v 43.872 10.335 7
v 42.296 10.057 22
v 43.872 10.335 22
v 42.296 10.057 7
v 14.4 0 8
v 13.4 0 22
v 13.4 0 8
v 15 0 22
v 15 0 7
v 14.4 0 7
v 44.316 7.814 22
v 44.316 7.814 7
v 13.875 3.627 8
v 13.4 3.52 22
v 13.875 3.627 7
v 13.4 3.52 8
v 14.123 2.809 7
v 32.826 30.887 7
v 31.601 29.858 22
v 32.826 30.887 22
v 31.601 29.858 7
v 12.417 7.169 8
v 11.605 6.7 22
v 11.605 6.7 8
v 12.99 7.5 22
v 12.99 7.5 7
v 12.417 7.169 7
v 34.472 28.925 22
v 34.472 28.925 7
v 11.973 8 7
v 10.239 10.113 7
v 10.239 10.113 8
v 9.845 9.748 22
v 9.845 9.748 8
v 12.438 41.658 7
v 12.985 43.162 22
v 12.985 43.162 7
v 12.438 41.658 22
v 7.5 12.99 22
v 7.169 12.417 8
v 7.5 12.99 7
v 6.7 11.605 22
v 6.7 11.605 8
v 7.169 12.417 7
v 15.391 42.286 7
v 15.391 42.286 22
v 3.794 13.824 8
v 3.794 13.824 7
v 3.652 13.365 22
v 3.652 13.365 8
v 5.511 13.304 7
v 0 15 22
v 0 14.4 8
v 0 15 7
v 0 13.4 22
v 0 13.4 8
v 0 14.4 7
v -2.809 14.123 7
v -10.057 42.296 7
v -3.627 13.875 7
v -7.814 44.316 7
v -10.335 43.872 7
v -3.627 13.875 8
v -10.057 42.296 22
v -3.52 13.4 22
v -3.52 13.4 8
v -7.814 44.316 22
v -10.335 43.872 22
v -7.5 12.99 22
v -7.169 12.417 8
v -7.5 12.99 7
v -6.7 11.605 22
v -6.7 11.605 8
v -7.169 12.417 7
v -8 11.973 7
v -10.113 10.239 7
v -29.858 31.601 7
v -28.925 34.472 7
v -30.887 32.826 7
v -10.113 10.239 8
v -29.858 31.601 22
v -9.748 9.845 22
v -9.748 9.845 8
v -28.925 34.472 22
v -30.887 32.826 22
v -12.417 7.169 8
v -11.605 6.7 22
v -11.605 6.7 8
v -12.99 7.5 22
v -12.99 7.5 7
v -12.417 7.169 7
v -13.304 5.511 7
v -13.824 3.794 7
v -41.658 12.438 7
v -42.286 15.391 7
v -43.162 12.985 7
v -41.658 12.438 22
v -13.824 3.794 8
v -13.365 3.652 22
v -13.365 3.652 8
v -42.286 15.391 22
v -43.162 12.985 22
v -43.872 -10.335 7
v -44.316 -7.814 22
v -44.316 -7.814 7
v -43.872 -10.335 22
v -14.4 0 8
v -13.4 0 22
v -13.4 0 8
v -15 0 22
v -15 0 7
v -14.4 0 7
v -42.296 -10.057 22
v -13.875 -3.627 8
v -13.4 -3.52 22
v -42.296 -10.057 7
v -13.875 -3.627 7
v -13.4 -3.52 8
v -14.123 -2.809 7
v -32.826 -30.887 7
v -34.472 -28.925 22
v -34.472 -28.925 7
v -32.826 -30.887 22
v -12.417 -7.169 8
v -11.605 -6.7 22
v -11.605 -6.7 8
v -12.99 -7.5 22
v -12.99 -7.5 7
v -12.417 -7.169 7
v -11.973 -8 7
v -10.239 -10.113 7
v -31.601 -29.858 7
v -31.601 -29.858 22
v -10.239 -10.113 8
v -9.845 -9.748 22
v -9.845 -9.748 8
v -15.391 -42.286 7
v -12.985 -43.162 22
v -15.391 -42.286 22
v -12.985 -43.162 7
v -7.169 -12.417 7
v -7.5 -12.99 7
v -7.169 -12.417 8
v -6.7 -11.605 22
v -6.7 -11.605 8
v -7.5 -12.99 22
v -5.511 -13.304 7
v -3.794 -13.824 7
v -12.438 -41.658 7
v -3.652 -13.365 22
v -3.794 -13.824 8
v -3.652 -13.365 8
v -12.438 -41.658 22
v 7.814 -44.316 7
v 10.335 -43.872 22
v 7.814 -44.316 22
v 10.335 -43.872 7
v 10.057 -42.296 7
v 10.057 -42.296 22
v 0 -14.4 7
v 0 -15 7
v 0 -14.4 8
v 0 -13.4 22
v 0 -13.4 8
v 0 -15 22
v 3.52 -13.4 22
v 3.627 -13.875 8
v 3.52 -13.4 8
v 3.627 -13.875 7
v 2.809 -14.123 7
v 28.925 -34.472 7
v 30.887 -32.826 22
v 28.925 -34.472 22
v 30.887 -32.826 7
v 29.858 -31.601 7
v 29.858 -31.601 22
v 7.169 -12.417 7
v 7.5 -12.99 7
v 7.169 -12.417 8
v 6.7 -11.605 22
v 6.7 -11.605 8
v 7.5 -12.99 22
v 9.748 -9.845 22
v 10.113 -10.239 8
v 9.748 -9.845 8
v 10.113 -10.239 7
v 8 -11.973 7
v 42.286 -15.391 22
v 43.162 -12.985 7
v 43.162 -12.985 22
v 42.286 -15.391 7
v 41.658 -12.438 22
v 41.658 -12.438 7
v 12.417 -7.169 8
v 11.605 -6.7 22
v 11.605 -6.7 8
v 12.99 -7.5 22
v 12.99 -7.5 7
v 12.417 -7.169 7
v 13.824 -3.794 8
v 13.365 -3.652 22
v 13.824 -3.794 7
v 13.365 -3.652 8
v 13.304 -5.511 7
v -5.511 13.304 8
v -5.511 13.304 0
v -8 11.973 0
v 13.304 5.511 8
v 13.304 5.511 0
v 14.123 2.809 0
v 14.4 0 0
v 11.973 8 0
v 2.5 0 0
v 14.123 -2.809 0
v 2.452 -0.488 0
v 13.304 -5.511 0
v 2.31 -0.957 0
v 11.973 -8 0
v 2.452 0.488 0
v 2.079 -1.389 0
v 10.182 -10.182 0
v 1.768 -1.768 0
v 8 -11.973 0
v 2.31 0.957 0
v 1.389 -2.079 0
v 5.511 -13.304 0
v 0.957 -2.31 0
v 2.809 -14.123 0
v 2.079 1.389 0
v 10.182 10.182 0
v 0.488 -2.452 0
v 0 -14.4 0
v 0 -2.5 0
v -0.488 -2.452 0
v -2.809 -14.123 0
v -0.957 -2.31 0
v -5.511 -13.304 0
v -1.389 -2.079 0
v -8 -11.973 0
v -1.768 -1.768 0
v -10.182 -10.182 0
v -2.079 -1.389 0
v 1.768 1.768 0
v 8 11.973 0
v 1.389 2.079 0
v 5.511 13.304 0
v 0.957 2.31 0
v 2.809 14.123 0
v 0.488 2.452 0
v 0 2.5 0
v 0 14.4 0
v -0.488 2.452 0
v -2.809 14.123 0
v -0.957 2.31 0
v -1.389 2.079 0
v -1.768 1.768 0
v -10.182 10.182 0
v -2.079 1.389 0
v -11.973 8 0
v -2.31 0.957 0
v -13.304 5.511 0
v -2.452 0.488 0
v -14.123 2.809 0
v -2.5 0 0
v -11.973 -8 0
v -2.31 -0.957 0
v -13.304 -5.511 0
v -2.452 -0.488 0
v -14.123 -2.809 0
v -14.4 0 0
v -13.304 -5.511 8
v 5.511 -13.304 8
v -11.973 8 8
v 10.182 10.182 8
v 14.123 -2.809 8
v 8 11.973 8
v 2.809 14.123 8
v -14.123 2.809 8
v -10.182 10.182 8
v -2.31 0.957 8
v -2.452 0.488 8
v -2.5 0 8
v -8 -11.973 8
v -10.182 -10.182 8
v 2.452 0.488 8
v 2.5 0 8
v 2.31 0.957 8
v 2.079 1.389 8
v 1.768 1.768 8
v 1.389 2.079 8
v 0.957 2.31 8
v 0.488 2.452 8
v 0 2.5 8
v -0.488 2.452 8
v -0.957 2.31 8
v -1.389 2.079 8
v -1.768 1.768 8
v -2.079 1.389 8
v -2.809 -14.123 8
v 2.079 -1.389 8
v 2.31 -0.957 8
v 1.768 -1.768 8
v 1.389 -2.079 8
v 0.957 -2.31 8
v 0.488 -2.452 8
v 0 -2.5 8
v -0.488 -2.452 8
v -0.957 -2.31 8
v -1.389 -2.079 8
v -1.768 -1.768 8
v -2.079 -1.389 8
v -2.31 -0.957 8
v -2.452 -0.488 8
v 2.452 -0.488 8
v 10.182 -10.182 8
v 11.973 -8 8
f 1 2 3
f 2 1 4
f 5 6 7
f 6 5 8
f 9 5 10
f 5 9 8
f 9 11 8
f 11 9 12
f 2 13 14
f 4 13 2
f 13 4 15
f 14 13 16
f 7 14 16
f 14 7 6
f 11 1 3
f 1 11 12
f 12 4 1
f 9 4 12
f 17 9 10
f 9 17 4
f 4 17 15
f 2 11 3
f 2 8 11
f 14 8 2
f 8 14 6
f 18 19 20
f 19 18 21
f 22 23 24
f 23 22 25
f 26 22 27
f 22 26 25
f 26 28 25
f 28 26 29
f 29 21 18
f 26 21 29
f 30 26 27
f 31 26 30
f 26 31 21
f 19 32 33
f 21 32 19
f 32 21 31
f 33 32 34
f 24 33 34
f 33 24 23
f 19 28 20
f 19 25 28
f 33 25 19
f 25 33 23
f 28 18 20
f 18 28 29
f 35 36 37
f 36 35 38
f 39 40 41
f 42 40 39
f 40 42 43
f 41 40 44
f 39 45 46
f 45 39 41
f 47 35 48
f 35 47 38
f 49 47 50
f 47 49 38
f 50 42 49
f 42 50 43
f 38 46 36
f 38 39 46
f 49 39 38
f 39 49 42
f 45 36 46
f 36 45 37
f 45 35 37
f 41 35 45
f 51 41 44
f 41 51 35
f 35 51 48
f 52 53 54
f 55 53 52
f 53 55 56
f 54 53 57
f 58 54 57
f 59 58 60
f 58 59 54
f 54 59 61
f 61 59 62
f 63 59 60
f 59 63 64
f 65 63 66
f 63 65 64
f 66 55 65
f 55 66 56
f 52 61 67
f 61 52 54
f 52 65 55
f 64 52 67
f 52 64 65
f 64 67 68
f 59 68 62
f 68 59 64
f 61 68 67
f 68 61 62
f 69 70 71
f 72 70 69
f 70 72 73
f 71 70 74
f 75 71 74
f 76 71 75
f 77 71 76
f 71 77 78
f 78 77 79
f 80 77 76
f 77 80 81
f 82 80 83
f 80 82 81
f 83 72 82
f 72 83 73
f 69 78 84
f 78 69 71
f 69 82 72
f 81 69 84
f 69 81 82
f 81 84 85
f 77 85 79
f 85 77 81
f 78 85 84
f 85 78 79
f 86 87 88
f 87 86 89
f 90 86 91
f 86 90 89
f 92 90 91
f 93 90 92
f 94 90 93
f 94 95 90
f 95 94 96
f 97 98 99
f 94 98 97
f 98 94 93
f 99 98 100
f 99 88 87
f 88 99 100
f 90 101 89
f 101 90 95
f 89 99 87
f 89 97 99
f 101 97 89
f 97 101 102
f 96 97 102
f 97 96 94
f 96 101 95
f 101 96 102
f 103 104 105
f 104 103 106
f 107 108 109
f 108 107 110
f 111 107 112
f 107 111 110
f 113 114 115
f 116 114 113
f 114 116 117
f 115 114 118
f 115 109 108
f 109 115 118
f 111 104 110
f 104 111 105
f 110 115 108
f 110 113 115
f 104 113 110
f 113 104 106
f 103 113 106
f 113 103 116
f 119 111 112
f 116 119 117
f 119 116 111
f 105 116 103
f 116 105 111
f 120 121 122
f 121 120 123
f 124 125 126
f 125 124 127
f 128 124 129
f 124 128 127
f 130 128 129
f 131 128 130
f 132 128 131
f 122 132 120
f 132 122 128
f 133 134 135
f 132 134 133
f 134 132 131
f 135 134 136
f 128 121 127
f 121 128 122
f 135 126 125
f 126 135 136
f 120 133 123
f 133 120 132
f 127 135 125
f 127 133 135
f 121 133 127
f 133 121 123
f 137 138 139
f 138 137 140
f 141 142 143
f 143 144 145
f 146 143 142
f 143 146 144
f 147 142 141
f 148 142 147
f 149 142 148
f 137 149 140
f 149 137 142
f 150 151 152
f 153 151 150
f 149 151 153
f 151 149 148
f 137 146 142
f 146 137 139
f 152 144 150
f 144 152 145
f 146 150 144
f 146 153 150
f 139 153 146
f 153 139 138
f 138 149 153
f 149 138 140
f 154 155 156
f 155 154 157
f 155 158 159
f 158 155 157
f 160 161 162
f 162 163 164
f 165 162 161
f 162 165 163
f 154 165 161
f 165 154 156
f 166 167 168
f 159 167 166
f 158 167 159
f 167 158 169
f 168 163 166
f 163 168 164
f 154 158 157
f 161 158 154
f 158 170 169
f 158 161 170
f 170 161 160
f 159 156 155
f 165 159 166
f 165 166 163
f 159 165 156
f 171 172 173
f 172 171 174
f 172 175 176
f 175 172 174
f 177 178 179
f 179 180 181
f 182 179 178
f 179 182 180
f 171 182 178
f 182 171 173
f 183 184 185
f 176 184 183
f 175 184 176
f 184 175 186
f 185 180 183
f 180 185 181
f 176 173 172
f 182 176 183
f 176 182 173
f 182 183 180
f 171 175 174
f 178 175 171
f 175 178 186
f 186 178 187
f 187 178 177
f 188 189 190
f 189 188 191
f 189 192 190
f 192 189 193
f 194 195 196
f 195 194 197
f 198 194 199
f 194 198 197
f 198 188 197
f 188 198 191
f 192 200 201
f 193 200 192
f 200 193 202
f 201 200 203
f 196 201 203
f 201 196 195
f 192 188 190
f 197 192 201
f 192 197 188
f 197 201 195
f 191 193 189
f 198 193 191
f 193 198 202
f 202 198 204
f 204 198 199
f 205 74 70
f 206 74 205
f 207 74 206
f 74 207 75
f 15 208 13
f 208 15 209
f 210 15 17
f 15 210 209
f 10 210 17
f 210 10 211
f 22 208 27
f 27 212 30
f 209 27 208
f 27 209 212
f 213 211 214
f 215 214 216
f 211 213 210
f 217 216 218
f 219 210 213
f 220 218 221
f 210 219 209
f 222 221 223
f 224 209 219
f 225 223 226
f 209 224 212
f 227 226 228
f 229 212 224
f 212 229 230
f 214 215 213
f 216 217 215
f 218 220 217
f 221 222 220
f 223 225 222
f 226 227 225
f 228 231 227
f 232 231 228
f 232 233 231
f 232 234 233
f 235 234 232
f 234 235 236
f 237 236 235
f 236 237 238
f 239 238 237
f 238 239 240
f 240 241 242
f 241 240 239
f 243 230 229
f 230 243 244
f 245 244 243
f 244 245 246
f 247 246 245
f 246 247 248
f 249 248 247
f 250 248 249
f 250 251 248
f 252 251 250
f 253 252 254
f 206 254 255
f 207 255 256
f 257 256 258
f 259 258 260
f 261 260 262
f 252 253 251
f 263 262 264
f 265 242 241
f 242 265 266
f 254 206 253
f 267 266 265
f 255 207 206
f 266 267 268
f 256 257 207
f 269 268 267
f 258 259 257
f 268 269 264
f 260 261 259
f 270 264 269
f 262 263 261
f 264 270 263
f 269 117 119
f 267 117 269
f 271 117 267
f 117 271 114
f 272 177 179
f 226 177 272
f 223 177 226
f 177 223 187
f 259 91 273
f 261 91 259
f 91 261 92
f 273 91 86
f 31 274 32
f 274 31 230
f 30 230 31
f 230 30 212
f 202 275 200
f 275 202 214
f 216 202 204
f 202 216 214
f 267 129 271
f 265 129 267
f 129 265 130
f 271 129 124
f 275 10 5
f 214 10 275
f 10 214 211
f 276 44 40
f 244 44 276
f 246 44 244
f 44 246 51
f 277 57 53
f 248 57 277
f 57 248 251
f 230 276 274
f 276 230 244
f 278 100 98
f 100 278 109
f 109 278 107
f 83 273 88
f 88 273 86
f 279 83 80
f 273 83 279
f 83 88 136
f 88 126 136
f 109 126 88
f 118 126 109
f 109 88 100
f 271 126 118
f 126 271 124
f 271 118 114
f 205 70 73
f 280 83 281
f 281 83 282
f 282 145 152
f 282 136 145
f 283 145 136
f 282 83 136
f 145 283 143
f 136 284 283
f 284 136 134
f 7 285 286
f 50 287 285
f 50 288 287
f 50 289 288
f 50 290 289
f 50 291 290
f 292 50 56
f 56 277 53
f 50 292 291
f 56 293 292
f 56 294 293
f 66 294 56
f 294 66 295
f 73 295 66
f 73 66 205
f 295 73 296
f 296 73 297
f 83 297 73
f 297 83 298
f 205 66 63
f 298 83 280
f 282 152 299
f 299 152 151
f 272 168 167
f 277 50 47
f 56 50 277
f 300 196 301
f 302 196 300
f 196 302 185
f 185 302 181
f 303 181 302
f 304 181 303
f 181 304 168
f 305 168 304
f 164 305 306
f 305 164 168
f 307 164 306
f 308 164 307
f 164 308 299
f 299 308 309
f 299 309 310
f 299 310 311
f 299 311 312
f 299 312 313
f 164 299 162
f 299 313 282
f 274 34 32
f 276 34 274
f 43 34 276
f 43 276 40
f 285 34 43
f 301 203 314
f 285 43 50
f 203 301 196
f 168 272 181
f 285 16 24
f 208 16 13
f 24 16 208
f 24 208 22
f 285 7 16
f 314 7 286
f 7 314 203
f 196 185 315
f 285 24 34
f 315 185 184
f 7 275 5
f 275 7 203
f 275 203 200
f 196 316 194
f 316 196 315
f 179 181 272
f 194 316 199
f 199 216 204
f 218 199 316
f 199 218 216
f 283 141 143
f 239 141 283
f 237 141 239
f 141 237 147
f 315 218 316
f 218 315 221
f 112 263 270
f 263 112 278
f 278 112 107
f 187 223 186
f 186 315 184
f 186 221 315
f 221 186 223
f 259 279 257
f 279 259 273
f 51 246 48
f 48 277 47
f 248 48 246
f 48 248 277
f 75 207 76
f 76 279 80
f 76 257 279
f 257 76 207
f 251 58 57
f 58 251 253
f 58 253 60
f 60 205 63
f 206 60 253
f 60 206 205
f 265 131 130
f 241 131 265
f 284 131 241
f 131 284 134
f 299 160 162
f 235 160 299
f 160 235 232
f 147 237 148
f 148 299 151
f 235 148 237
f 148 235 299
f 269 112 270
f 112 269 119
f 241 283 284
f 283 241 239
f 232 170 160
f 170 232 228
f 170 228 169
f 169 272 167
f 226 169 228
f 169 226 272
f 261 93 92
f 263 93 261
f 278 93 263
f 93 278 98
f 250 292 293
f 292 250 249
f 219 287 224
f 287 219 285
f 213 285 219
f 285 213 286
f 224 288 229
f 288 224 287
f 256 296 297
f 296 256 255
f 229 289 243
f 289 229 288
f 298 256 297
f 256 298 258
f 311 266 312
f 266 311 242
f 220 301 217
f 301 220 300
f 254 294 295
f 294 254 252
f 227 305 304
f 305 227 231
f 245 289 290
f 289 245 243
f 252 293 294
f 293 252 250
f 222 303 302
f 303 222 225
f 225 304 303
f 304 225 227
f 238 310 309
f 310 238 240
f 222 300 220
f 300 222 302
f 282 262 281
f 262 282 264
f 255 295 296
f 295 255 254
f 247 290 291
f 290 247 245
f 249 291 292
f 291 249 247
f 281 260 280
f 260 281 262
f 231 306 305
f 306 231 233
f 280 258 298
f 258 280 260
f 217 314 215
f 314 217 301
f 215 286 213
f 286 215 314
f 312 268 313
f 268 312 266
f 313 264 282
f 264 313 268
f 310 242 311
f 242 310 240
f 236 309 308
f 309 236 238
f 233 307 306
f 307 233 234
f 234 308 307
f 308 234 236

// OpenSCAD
$fn = 32;

// ----------------------------------------------------------------------
// Impeller: 90 mm, 12 blades, 22 mm tall
// ----------------------------------------------------------------------

// --- parameters (mm) ---
hub_d = 28.8;             // hub diameter
hub_h = 8;                // hub height
imp_d = 90;               // outer diameter over the blades
blades = 12;              // number of blades
blade_t = 1.6;            // blade thickness
blade_h = 14;             // blade height
blade_in_r = 13.4;        // blade root radius
blade_out_r = 43.4;       // blade tip radius
sweep = 10;               // blade sweep, degrees
bore_d = 5;               // shaft bore

module hub() {
  cylinder(h = hub_h, d = hub_d);
}

module blade() {
  /* blade swept between two boxes: hull of the root and the tip section */
  hull() {
    translate([blade_in_r, 0, hub_h - 1])
      cube([blade_t, blade_t * 2.2, blade_h + 1], center = false);
    rotate([0, 0, sweep])
      translate([blade_out_r, 0, hub_h - 1])
        cube([blade_t, blade_t * 1.6, blade_h + 1], center = false);
  }
}

module blades() {
  for (i = [0 : blades - 1])
    rotate([0, 0, i * 360 / blades]) blade();
}

difference() {
  union() {
    hub();
    blades();
  }
  translate([0, 0, -1]) cylinder(h = hub_h + blade_h + 0 + 3, d = bore_d);
}
